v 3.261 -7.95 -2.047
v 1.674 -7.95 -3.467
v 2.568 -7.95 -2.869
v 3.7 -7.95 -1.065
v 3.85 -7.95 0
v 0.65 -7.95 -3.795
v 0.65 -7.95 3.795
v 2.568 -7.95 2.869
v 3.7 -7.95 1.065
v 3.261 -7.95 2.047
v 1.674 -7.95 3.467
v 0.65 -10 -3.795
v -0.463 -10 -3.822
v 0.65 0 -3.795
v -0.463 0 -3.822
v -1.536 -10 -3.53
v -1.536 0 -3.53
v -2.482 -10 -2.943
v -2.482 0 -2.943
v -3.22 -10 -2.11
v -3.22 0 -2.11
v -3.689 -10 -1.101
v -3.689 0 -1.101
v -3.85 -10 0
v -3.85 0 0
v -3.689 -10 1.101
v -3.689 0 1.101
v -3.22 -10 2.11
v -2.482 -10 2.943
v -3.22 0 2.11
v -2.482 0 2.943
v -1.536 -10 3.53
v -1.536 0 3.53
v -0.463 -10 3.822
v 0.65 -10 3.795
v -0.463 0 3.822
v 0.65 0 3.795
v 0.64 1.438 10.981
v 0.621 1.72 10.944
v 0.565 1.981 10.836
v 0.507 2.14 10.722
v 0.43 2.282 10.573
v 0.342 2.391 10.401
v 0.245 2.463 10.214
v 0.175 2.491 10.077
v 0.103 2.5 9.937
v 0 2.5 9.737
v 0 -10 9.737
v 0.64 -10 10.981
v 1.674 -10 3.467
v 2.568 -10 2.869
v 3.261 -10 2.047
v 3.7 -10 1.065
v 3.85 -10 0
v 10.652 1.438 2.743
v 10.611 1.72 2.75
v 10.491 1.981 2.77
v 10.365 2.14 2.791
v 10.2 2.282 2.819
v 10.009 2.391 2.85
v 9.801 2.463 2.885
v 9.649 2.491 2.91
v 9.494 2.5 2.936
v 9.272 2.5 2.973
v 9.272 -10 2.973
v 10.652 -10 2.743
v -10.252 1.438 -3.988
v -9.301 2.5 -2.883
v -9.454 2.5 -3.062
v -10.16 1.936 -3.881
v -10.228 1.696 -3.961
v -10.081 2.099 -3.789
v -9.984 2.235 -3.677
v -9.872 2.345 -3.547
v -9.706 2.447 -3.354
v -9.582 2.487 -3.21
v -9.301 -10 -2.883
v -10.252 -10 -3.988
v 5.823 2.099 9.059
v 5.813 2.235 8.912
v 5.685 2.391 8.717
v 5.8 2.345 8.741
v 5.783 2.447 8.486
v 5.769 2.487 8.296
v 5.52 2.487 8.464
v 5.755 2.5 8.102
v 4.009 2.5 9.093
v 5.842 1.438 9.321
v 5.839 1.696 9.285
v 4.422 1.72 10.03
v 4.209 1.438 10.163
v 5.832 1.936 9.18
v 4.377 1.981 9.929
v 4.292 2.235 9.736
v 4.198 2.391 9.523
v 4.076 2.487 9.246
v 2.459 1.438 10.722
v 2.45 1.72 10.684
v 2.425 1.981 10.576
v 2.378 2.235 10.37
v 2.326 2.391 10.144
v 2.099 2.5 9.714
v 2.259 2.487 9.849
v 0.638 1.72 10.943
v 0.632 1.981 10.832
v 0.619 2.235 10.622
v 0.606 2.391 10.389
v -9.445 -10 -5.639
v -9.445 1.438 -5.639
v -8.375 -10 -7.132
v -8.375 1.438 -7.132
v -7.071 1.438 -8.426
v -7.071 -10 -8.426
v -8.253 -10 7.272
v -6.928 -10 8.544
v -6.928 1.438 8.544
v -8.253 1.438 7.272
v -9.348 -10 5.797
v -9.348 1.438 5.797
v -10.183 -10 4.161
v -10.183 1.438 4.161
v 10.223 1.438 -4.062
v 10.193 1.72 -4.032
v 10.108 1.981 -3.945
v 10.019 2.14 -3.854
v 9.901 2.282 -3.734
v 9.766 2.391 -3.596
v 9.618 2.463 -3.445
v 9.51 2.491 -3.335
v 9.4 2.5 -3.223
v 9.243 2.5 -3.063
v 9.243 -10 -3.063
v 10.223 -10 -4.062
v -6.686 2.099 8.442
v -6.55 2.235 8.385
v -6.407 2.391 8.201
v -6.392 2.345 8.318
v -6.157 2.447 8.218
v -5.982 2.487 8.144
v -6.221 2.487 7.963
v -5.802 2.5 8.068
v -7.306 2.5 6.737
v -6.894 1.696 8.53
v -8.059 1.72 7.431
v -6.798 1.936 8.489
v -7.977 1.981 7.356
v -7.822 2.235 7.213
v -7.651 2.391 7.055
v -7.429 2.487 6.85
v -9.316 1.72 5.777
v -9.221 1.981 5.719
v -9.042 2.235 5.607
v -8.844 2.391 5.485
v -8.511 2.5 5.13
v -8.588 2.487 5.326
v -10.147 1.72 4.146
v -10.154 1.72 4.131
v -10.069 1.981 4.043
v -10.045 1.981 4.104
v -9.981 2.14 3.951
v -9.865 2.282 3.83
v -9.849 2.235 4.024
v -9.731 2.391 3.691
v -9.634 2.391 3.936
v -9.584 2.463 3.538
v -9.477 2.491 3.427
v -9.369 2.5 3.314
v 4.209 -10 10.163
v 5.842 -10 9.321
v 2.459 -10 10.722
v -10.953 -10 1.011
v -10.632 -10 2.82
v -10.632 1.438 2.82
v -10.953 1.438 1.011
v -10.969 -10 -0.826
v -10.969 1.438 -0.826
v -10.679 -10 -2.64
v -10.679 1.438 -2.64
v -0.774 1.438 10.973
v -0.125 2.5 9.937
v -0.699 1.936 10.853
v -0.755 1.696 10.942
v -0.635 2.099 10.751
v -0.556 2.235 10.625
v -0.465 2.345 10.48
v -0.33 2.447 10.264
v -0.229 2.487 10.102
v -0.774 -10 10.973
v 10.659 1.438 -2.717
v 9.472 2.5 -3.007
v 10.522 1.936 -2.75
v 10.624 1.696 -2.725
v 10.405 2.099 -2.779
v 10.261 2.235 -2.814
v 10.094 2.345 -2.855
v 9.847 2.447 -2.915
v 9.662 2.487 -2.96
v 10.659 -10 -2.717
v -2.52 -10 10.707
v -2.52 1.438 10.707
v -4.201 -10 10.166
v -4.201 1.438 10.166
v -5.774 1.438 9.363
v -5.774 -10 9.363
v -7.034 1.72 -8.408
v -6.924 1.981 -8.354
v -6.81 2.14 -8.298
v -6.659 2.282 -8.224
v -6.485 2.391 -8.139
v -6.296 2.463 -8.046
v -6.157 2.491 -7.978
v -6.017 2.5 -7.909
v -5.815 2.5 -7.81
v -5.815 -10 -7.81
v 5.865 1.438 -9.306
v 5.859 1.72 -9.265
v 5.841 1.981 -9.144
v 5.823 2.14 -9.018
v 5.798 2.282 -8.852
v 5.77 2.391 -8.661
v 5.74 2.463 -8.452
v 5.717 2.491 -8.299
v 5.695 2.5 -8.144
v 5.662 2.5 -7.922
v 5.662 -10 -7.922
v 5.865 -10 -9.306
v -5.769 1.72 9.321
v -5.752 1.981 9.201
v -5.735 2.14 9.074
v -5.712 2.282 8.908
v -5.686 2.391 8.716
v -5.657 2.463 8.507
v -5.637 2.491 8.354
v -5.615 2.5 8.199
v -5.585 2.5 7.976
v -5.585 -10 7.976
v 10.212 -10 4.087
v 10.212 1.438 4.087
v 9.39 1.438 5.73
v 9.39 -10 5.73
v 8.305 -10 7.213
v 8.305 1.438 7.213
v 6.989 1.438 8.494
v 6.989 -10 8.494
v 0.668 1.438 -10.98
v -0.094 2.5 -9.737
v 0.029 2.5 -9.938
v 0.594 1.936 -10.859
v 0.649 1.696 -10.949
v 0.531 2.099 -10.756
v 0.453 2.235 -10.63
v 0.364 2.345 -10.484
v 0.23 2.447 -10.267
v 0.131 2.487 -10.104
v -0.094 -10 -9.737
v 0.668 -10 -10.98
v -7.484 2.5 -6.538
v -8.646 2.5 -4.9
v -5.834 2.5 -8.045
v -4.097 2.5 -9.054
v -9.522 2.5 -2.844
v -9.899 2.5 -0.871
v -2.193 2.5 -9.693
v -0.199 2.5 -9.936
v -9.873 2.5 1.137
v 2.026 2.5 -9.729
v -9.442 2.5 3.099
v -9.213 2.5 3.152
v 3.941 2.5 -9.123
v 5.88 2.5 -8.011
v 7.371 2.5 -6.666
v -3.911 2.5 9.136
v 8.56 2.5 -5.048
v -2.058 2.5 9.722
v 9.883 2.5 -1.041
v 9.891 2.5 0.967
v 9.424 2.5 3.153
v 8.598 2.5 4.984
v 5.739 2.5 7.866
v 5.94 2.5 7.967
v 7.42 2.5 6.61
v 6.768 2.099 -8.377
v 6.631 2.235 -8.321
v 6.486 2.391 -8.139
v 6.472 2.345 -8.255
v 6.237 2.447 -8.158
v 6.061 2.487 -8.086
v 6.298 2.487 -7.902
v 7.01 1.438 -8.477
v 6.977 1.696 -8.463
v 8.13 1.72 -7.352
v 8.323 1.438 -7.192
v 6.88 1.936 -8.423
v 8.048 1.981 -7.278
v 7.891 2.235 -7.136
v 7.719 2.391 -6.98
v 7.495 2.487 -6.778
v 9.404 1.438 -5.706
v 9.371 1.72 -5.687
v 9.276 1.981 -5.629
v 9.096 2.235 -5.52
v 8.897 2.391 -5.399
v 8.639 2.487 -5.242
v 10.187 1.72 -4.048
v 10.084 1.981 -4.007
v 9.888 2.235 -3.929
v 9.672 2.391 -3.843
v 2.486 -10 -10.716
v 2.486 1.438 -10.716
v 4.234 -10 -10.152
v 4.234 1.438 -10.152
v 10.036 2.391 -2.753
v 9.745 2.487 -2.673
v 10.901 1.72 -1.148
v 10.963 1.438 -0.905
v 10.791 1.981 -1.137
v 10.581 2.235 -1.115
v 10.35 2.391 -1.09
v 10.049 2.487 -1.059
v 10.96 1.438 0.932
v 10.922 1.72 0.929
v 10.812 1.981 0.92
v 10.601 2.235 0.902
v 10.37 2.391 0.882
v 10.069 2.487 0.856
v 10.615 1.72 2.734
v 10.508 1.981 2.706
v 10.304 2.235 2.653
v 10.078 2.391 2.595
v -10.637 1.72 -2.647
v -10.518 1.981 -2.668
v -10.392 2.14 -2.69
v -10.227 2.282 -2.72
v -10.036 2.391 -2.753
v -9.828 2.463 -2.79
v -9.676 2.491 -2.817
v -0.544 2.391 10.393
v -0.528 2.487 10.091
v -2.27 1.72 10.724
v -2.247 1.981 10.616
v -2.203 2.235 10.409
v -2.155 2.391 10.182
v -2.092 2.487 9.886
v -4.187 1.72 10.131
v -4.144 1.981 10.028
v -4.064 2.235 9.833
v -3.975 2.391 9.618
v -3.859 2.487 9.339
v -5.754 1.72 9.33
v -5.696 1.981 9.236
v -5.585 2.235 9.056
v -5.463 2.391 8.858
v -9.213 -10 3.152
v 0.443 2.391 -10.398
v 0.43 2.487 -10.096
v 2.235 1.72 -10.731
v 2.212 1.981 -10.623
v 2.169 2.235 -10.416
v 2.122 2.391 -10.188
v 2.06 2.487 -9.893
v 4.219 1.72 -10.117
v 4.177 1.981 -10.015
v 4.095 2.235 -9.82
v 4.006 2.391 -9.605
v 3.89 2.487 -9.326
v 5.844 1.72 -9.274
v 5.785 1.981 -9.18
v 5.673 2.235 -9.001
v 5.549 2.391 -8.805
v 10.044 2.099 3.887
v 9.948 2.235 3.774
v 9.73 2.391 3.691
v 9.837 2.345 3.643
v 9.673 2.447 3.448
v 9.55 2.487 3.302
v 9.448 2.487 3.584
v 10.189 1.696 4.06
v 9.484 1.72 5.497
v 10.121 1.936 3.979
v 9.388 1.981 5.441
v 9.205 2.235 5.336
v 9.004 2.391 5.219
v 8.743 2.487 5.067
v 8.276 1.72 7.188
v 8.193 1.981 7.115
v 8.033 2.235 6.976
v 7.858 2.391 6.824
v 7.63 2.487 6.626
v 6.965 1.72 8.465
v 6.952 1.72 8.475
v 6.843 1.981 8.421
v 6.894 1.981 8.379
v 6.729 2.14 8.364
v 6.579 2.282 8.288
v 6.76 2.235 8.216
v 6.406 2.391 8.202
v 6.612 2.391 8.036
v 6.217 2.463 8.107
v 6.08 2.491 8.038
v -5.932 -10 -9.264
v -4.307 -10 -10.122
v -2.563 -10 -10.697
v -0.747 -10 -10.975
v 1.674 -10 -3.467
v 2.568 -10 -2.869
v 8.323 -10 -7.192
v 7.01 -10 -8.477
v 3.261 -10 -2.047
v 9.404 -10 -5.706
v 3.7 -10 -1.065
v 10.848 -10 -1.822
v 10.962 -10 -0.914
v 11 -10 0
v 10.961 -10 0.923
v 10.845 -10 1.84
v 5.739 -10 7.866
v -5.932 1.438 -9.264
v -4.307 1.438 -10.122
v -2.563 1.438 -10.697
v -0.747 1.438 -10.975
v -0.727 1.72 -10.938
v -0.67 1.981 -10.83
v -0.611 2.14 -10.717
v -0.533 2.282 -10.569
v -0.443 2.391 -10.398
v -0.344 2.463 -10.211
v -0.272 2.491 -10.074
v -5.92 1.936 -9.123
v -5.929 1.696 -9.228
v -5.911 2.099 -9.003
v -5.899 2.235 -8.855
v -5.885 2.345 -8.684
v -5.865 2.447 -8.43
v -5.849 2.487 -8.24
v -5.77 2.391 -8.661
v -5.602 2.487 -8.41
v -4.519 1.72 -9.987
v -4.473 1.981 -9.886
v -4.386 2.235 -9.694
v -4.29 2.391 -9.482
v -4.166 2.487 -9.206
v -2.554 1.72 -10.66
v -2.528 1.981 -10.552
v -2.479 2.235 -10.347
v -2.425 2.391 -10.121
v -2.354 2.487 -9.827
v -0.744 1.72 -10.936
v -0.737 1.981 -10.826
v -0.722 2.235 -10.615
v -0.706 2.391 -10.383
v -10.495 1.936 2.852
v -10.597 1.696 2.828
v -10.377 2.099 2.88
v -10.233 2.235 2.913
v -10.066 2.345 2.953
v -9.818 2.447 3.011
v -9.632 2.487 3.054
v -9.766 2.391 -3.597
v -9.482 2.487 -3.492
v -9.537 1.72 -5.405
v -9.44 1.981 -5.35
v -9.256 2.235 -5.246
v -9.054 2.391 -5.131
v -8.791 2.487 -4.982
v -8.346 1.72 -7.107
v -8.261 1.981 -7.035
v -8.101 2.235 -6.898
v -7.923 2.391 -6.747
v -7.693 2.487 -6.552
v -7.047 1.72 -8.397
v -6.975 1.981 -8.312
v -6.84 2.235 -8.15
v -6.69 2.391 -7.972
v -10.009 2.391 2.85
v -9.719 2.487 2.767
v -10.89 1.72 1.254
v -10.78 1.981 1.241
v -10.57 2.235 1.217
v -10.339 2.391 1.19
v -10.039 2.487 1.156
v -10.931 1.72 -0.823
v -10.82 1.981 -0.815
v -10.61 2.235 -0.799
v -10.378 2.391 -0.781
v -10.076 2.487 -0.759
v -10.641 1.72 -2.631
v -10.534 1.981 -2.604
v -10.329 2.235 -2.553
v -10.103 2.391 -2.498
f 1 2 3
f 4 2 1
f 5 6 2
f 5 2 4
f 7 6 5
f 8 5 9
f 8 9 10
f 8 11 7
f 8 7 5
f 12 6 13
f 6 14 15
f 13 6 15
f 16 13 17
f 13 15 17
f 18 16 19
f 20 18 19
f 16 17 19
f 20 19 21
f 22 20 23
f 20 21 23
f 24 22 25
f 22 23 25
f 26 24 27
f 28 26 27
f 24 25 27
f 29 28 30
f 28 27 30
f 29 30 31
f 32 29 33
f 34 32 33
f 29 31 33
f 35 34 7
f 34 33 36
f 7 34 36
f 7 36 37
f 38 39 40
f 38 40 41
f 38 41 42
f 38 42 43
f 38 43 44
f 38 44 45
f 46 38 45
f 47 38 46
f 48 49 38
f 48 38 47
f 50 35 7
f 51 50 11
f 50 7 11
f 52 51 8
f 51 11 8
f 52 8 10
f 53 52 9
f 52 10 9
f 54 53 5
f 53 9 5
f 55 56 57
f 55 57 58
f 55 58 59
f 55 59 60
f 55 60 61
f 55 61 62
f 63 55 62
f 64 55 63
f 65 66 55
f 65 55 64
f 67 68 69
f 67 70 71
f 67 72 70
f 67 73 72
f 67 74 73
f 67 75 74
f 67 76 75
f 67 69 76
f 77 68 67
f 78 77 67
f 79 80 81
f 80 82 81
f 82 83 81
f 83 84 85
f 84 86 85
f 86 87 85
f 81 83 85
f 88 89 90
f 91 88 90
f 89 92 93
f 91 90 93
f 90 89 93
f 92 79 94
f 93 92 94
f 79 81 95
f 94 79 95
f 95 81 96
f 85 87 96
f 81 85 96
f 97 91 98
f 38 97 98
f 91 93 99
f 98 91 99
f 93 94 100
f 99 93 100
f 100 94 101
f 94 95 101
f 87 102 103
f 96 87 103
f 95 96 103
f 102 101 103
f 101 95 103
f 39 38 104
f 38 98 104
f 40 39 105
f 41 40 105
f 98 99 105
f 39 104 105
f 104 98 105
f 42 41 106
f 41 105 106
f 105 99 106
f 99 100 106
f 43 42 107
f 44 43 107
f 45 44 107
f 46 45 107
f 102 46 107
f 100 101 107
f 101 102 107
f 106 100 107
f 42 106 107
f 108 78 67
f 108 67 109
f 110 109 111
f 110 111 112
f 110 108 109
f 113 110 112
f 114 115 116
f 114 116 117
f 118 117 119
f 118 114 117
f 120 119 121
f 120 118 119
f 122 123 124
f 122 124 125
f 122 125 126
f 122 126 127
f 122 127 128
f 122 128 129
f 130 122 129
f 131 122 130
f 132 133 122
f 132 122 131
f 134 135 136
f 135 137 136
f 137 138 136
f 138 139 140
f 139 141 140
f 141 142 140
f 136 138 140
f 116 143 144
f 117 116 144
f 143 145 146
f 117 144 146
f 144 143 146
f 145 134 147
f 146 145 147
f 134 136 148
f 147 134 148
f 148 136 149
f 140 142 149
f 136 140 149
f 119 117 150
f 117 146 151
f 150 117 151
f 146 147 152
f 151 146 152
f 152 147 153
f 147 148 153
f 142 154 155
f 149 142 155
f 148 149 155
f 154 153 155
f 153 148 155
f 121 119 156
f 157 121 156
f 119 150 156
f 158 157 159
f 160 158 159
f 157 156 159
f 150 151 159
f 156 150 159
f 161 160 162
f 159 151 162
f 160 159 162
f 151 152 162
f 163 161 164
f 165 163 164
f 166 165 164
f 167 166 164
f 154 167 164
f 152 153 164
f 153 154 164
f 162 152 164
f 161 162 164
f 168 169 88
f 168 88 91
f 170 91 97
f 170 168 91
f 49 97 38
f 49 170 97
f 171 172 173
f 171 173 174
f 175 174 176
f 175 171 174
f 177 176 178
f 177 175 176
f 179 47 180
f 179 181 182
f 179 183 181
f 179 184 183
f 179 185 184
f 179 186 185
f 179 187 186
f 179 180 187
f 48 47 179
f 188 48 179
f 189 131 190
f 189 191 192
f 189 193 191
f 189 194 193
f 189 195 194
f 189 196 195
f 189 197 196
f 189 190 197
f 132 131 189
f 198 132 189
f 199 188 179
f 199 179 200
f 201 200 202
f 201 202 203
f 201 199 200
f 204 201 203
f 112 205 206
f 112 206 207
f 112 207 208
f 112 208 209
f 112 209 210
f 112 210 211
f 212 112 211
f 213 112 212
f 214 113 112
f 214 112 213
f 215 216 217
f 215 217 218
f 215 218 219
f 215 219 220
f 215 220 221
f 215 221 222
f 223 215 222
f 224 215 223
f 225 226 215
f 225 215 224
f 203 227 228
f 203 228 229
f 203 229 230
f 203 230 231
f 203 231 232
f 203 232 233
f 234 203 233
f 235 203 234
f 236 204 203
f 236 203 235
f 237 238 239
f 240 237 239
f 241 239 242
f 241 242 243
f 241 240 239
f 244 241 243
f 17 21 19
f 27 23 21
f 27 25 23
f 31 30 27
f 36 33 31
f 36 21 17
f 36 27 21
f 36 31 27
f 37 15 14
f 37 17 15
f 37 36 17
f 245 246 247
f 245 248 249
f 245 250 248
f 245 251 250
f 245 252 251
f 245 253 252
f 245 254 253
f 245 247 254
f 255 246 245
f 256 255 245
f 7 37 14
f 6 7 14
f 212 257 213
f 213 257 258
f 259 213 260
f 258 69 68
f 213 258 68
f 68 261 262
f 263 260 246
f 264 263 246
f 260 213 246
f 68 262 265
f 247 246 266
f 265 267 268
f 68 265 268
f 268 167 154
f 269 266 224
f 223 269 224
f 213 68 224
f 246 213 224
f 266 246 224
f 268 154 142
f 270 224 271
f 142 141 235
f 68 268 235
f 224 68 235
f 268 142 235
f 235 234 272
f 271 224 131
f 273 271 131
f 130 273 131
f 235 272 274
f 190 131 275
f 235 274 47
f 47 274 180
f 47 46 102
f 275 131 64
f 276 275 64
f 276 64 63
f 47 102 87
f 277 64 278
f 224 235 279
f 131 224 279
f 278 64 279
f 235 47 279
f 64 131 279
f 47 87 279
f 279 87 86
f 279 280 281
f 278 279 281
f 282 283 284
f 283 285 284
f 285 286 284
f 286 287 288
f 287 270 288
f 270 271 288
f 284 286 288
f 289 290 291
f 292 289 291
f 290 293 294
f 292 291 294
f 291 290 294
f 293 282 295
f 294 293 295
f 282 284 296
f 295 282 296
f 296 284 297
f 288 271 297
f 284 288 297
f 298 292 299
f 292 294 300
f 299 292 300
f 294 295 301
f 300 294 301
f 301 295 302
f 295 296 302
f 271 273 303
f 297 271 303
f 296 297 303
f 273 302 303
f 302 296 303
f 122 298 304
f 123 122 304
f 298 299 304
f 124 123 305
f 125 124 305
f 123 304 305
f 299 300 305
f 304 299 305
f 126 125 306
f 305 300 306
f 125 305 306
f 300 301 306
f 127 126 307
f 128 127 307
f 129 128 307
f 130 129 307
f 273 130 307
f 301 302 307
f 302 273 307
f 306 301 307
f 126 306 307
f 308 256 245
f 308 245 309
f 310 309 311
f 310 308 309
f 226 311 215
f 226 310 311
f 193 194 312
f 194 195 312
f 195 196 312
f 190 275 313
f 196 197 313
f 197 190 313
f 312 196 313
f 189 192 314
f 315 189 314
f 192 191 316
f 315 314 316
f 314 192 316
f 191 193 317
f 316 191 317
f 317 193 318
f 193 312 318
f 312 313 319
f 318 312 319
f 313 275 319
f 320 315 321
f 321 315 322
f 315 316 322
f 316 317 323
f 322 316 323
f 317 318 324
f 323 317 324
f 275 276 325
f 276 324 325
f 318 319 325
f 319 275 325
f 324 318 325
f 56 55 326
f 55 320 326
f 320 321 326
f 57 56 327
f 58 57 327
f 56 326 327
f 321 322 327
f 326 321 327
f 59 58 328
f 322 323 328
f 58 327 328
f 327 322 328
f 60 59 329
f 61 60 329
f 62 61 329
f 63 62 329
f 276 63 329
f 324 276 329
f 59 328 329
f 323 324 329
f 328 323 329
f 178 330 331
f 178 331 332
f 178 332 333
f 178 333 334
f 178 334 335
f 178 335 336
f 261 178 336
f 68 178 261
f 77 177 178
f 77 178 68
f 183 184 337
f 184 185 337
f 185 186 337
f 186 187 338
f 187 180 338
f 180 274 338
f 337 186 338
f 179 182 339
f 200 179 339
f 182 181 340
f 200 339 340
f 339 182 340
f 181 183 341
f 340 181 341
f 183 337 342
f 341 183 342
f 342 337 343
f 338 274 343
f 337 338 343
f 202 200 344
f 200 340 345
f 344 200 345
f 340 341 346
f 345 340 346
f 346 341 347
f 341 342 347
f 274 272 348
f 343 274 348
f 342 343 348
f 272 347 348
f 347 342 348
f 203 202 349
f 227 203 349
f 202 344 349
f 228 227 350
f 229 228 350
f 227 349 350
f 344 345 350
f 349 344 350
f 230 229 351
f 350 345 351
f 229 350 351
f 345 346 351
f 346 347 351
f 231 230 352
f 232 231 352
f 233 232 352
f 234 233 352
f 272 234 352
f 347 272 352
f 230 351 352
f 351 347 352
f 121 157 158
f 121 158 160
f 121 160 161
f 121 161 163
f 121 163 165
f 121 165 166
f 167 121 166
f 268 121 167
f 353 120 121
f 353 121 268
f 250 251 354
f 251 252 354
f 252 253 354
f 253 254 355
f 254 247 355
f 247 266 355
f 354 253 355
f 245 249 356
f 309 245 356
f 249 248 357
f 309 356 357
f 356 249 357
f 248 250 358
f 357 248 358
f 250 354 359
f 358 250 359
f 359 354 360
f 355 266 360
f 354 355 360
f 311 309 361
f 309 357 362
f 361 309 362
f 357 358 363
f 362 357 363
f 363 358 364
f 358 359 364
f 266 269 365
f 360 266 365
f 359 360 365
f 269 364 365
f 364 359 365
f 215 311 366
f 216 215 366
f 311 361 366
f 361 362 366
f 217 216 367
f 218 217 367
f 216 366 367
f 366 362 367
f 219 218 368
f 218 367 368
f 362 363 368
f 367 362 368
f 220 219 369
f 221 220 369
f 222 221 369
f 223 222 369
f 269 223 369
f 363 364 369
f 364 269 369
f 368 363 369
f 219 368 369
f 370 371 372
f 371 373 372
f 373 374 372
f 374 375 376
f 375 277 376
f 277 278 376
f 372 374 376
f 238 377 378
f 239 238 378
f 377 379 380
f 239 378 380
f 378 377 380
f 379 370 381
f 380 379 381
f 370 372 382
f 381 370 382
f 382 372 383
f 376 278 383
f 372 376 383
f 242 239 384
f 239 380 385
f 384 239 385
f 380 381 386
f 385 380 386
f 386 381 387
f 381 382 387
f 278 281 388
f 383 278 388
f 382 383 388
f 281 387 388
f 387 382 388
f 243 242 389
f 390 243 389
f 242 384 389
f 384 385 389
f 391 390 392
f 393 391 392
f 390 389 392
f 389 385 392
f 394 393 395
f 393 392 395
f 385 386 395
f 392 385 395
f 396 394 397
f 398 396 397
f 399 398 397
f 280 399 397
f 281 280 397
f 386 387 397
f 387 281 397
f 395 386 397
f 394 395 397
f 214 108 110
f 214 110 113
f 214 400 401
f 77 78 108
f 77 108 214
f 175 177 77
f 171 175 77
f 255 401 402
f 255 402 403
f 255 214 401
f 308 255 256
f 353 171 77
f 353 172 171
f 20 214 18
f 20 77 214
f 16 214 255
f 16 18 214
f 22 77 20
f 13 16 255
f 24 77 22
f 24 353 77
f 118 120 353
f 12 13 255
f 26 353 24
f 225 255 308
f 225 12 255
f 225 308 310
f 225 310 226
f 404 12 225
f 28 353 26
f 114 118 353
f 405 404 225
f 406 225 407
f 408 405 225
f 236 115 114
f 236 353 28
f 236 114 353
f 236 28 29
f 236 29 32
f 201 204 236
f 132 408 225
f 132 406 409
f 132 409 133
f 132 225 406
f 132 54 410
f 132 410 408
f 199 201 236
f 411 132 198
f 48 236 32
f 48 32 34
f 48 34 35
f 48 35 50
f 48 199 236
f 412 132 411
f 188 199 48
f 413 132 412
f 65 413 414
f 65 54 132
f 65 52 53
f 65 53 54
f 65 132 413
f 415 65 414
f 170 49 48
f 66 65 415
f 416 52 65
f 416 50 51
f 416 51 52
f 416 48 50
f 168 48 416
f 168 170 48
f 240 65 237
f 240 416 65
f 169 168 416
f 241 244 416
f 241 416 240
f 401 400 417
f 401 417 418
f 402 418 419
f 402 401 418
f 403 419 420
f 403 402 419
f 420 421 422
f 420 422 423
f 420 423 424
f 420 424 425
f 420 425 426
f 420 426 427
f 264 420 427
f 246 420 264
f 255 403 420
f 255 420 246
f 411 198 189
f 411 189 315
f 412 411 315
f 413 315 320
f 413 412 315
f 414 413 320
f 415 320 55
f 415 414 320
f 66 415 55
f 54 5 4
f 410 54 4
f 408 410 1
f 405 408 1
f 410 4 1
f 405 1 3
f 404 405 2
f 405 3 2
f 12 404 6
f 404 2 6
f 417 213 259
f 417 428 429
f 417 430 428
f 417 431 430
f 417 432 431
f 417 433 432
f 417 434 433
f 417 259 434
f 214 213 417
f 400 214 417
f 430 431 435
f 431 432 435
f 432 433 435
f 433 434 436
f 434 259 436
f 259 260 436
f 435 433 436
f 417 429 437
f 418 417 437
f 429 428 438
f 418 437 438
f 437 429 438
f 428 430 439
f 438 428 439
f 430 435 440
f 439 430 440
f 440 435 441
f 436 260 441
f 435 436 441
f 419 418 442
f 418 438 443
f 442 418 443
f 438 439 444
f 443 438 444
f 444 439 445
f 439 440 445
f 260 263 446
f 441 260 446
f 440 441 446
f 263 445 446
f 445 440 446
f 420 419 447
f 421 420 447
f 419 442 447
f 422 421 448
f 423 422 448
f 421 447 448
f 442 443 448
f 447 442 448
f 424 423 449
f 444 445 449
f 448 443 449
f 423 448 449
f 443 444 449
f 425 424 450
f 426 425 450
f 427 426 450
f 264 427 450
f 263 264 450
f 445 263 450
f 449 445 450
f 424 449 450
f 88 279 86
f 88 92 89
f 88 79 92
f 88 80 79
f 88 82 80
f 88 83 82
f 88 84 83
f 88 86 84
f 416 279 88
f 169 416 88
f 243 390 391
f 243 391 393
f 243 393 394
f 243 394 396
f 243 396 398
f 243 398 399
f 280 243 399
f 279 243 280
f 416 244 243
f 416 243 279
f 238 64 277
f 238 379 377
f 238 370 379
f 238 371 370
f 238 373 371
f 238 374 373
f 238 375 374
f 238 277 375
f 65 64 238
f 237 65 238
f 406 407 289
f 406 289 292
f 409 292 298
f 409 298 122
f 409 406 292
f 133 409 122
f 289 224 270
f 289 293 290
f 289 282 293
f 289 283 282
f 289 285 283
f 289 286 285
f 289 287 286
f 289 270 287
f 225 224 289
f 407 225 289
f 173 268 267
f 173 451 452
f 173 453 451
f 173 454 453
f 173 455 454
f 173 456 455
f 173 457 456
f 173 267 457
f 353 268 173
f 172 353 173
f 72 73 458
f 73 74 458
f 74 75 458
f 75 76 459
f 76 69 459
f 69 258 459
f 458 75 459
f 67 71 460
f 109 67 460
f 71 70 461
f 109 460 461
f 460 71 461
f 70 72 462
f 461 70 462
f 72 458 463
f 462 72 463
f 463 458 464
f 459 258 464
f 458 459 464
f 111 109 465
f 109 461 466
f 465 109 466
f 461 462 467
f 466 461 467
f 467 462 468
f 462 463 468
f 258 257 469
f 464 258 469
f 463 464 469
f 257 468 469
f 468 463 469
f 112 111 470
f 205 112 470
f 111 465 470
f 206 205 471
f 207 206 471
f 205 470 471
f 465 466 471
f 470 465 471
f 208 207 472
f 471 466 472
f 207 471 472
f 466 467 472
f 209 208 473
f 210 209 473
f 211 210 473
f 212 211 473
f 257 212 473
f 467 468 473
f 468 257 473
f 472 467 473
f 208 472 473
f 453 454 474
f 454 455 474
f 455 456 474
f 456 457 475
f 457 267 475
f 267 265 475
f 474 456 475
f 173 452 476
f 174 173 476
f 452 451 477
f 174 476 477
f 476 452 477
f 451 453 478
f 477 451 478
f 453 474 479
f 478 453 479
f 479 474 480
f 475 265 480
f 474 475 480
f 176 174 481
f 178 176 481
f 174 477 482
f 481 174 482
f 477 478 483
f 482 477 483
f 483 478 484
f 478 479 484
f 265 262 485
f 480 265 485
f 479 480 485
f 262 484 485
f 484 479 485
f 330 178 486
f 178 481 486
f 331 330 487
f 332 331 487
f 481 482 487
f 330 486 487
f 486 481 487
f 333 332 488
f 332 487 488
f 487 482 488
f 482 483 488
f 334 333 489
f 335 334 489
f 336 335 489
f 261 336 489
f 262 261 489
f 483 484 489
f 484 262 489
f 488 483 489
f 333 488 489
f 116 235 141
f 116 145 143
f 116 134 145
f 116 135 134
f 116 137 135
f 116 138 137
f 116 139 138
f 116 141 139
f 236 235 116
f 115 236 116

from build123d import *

# Parameters (mm, degrees)
F1_DEPTH = 10
F2_DEPTH = 7.95
F3_DEPTH = 2.5
F4_R     = 1.0622539674


with BuildPart() as f1:
    # F0 (on Front) → F1 (new body)
    with BuildSketch(Plane.XZ):
        with BuildLine():
            ThreePointArc((10.6592367905, -2.7167390458), (10.9144767327, -1.3690133864), (11, 0))
            ThreePointArc((11, 0), (10.9127641391, 1.3825985843), (10.65244021, 2.7432676816))
            Line((10.65244021, 2.7432676816), (9.2721758837, 2.9730035594))
            Line((9.2721758837, 2.9730035594), (10.2124558135, 4.0872663551))
            ThreePointArc((10.2124558135, 4.0872663551), (8.8785549643, 6.4939403867), (6.9890934799, 8.4942670272))
            Line((6.9890934799, 8.4942670272), (5.7386160604, 7.8664020679))
            Line((5.7386160604, 7.8664020679), (5.8415511192, 9.3207446335))
            ThreePointArc((5.8415511192, 9.3207446335), (3.3455445115, 10.4788993659), (0.6401960862, 10.9813546055))
            Line((0.6401960862, 10.9813546055), (0, 9.7371451557))
            Line((0, 9.7371451557), (-0.7739624833, 10.9727381302))
            ThreePointArc((-0.7739624833, 10.9727381302), (-3.3716222336, 10.4705378808), (-5.7742283081, 9.3626004638))
            Line((-5.7742283081, 9.3626004638), (-5.5849970186, 7.9762023598))
            Line((-5.5849970186, 7.9762023598), (-6.9276969841, 8.5444142278))
            ThreePointArc((-6.9276969841, 8.5444142278), (-8.8315250081, 6.5577561735), (-10.1827352173, 4.1607575626))
            Line((-10.1827352173, 4.1607575626), (-9.2127819423, 3.1522443856))
            Line((-9.2127819423, 3.1522443856), (-10.6323938835, 2.819964593))
            ThreePointArc((-10.6323938835, 2.819964593), (-10.9996071509, 0.0929651823), (-10.6785385121, -2.6398513682))
            Line((-10.6785385121, -2.6398513682), (-9.300566617, -2.8829596573))
            Line((-9.300566617, -2.8829596573), (-10.2516063733, -3.9880530046))
            ThreePointArc((-10.2516063733, -3.9880530046), (-8.941103633, -6.407547567), (-7.0711263799, -8.4261006236))
            Line((-7.0711263799, -8.4261006236), (-5.8146198884, -7.8103899606))
            Line((-5.8146198884, -7.8103899606), (-5.9316515908, -9.2636660888))
            ThreePointArc((-5.9316515908, -9.2636660888), (-3.4469919259, -10.445967962), (-0.7466425421, -10.9746309694))
            Line((-0.7466425421, -10.9746309694), (-0.0944125443, -9.7366874272))
            Line((-0.0944125443, -9.7366874272), (0.6675330963, -10.9797267528))
            ThreePointArc((0.6675330963, -10.9797267528), (3.3716222336, -10.4705378808), (5.8647377838, -9.3061727218))
            Line((5.8647377838, -9.3061727218), (5.662072705, -7.9216745998))
            Line((5.662072705, -7.9216745998), (7.0102190036, -8.4768407748))
            ThreePointArc((7.0102190036, -8.4768407748), (8.8946946533, -6.4718163621), (10.2225997539, -4.0618289319))
            Line((10.2225997539, -4.0618289319), (9.2429134084, -3.0627679486))
            Line((9.2429134084, -3.0627679486), (10.6592367905, -2.7167390458))
        make_face()
        with BuildLine():
            ThreePointArc((0.65, 3.7947331922), (2.9432125306, 2.4819347292), (3.85, 0))
            ThreePointArc((3.85, 0), (2.9432125306, -2.4819347292), (0.65, -3.7947331922))
            ThreePointArc((0.65, -3.7947331922), (-3.85, 0), (0.65, 3.7947331922))
        make_face(mode=Mode.SUBTRACT)
    extrude(amount=F1_DEPTH)

    # F0 (on Front) → F2 (join)
    with BuildSketch(Plane.XZ):
        with BuildLine():
            ThreePointArc((0.65, -3.7947331922), (2.9432125306, -2.4819347292), (3.85, 0))
            ThreePointArc((3.85, 0), (2.9432125306, 2.4819347292), (0.65, 3.7947331922))
            Line((0.65, 3.7947331922), (0.65, -3.7947331922))
        make_face()
    extrude(amount=F2_DEPTH)

    # F0 (on Front) → F3 (join)
    with BuildSketch(Plane.XZ):
        with BuildLine():
            ThreePointArc((10.6592367905, -2.7167390458), (10.9144767327, -1.3690133864), (11, 0))
            ThreePointArc((11, 0), (10.9127641391, 1.3825985843), (10.65244021, 2.7432676816))
            Line((10.65244021, 2.7432676816), (9.2721758837, 2.9730035594))
            Line((9.2721758837, 2.9730035594), (10.2124558135, 4.0872663551))
            ThreePointArc((10.2124558135, 4.0872663551), (8.8785549643, 6.4939403867), (6.9890934799, 8.4942670272))
            Line((6.9890934799, 8.4942670272), (5.7386160604, 7.8664020679))
            Line((5.7386160604, 7.8664020679), (5.8415511192, 9.3207446335))
            ThreePointArc((5.8415511192, 9.3207446335), (3.3455445115, 10.4788993659), (0.6401960862, 10.9813546055))
            Line((0.6401960862, 10.9813546055), (0, 9.7371451557))
            Line((0, 9.7371451557), (-0.7739624833, 10.9727381302))
            ThreePointArc((-0.7739624833, 10.9727381302), (-3.3716222336, 10.4705378808), (-5.7742283081, 9.3626004638))
            Line((-5.7742283081, 9.3626004638), (-5.5849970186, 7.9762023598))
            Line((-5.5849970186, 7.9762023598), (-6.9276969841, 8.5444142278))
            ThreePointArc((-6.9276969841, 8.5444142278), (-8.8315250081, 6.5577561735), (-10.1827352173, 4.1607575626))
            Line((-10.1827352173, 4.1607575626), (-9.2127819423, 3.1522443856))
            Line((-9.2127819423, 3.1522443856), (-10.6323938835, 2.819964593))
            ThreePointArc((-10.6323938835, 2.819964593), (-10.9996071509, 0.0929651823), (-10.6785385121, -2.6398513682))
            Line((-10.6785385121, -2.6398513682), (-9.300566617, -2.8829596573))
            Line((-9.300566617, -2.8829596573), (-10.2516063733, -3.9880530046))
            ThreePointArc((-10.2516063733, -3.9880530046), (-8.941103633, -6.407547567), (-7.0711263799, -8.4261006236))
            Line((-7.0711263799, -8.4261006236), (-5.8146198884, -7.8103899606))
            Line((-5.8146198884, -7.8103899606), (-5.9316515908, -9.2636660888))
            ThreePointArc((-5.9316515908, -9.2636660888), (-3.4469919259, -10.445967962), (-0.7466425421, -10.9746309694))
            Line((-0.7466425421, -10.9746309694), (-0.0944125443, -9.7366874272))
            Line((-0.0944125443, -9.7366874272), (0.6675330963, -10.9797267528))
            ThreePointArc((0.6675330963, -10.9797267528), (3.3716222336, -10.4705378808), (5.8647377838, -9.3061727218))
            Line((5.8647377838, -9.3061727218), (5.662072705, -7.9216745998))
            Line((5.662072705, -7.9216745998), (7.0102190036, -8.4768407748))
            ThreePointArc((7.0102190036, -8.4768407748), (8.8946946533, -6.4718163621), (10.2225997539, -4.0618289319))
            Line((10.2225997539, -4.0618289319), (9.2429134084, -3.0627679486))
            Line((9.2429134084, -3.0627679486), (10.6592367905, -2.7167390458))
        make_face()
        with BuildLine():
            ThreePointArc((0.65, 3.7947331922), (2.9432125306, 2.4819347292), (3.85, 0))
            ThreePointArc((3.85, 0), (2.9432125306, -2.4819347292), (0.65, -3.7947331922))
            ThreePointArc((0.65, -3.7947331922), (-3.85, 0), (0.65, 3.7947331922))
        make_face(mode=Mode.SUBTRACT)
        with BuildLine():
            Line((0.65, -3.7947331922), (0.65, 3.7947331922))
            ThreePointArc((0.65, 3.7947331922), (-3.85, 0), (0.65, -3.7947331922))
        make_face()
        with BuildLine():
            ThreePointArc((0.65, -3.7947331922), (2.9432125306, -2.4819347292), (3.85, 0))
            ThreePointArc((3.85, 0), (2.9432125306, 2.4819347292), (0.65, 3.7947331922))
            Line((0.65, 3.7947331922), (0.65, -3.7947331922))
        make_face()
    extrude(amount=-F3_DEPTH)

    # F4
    f4_edges = [f1.edges().sort_by_distance(p)[0] for p in [
        (-3.446992, 2.5, -10.445968),
        (3.371622, 2.5, -10.470538),
        (8.878555, 2.5, 6.49394),
        (3.345545, 2.5, 10.478899),
        (-3.371622, 2.5, 10.470538),
        (-8.831525, 2.5, 6.557756),
        (-10.999607, 2.5, 0.092965),
        (-8.941104, 2.5, -6.407548),
        (8.894695, 2.5, -6.471816),
        (10.999991, 2.5, 0.013693),
    ]]
    fillet(f4_edges, radius=F4_R)


solid = f1.part
